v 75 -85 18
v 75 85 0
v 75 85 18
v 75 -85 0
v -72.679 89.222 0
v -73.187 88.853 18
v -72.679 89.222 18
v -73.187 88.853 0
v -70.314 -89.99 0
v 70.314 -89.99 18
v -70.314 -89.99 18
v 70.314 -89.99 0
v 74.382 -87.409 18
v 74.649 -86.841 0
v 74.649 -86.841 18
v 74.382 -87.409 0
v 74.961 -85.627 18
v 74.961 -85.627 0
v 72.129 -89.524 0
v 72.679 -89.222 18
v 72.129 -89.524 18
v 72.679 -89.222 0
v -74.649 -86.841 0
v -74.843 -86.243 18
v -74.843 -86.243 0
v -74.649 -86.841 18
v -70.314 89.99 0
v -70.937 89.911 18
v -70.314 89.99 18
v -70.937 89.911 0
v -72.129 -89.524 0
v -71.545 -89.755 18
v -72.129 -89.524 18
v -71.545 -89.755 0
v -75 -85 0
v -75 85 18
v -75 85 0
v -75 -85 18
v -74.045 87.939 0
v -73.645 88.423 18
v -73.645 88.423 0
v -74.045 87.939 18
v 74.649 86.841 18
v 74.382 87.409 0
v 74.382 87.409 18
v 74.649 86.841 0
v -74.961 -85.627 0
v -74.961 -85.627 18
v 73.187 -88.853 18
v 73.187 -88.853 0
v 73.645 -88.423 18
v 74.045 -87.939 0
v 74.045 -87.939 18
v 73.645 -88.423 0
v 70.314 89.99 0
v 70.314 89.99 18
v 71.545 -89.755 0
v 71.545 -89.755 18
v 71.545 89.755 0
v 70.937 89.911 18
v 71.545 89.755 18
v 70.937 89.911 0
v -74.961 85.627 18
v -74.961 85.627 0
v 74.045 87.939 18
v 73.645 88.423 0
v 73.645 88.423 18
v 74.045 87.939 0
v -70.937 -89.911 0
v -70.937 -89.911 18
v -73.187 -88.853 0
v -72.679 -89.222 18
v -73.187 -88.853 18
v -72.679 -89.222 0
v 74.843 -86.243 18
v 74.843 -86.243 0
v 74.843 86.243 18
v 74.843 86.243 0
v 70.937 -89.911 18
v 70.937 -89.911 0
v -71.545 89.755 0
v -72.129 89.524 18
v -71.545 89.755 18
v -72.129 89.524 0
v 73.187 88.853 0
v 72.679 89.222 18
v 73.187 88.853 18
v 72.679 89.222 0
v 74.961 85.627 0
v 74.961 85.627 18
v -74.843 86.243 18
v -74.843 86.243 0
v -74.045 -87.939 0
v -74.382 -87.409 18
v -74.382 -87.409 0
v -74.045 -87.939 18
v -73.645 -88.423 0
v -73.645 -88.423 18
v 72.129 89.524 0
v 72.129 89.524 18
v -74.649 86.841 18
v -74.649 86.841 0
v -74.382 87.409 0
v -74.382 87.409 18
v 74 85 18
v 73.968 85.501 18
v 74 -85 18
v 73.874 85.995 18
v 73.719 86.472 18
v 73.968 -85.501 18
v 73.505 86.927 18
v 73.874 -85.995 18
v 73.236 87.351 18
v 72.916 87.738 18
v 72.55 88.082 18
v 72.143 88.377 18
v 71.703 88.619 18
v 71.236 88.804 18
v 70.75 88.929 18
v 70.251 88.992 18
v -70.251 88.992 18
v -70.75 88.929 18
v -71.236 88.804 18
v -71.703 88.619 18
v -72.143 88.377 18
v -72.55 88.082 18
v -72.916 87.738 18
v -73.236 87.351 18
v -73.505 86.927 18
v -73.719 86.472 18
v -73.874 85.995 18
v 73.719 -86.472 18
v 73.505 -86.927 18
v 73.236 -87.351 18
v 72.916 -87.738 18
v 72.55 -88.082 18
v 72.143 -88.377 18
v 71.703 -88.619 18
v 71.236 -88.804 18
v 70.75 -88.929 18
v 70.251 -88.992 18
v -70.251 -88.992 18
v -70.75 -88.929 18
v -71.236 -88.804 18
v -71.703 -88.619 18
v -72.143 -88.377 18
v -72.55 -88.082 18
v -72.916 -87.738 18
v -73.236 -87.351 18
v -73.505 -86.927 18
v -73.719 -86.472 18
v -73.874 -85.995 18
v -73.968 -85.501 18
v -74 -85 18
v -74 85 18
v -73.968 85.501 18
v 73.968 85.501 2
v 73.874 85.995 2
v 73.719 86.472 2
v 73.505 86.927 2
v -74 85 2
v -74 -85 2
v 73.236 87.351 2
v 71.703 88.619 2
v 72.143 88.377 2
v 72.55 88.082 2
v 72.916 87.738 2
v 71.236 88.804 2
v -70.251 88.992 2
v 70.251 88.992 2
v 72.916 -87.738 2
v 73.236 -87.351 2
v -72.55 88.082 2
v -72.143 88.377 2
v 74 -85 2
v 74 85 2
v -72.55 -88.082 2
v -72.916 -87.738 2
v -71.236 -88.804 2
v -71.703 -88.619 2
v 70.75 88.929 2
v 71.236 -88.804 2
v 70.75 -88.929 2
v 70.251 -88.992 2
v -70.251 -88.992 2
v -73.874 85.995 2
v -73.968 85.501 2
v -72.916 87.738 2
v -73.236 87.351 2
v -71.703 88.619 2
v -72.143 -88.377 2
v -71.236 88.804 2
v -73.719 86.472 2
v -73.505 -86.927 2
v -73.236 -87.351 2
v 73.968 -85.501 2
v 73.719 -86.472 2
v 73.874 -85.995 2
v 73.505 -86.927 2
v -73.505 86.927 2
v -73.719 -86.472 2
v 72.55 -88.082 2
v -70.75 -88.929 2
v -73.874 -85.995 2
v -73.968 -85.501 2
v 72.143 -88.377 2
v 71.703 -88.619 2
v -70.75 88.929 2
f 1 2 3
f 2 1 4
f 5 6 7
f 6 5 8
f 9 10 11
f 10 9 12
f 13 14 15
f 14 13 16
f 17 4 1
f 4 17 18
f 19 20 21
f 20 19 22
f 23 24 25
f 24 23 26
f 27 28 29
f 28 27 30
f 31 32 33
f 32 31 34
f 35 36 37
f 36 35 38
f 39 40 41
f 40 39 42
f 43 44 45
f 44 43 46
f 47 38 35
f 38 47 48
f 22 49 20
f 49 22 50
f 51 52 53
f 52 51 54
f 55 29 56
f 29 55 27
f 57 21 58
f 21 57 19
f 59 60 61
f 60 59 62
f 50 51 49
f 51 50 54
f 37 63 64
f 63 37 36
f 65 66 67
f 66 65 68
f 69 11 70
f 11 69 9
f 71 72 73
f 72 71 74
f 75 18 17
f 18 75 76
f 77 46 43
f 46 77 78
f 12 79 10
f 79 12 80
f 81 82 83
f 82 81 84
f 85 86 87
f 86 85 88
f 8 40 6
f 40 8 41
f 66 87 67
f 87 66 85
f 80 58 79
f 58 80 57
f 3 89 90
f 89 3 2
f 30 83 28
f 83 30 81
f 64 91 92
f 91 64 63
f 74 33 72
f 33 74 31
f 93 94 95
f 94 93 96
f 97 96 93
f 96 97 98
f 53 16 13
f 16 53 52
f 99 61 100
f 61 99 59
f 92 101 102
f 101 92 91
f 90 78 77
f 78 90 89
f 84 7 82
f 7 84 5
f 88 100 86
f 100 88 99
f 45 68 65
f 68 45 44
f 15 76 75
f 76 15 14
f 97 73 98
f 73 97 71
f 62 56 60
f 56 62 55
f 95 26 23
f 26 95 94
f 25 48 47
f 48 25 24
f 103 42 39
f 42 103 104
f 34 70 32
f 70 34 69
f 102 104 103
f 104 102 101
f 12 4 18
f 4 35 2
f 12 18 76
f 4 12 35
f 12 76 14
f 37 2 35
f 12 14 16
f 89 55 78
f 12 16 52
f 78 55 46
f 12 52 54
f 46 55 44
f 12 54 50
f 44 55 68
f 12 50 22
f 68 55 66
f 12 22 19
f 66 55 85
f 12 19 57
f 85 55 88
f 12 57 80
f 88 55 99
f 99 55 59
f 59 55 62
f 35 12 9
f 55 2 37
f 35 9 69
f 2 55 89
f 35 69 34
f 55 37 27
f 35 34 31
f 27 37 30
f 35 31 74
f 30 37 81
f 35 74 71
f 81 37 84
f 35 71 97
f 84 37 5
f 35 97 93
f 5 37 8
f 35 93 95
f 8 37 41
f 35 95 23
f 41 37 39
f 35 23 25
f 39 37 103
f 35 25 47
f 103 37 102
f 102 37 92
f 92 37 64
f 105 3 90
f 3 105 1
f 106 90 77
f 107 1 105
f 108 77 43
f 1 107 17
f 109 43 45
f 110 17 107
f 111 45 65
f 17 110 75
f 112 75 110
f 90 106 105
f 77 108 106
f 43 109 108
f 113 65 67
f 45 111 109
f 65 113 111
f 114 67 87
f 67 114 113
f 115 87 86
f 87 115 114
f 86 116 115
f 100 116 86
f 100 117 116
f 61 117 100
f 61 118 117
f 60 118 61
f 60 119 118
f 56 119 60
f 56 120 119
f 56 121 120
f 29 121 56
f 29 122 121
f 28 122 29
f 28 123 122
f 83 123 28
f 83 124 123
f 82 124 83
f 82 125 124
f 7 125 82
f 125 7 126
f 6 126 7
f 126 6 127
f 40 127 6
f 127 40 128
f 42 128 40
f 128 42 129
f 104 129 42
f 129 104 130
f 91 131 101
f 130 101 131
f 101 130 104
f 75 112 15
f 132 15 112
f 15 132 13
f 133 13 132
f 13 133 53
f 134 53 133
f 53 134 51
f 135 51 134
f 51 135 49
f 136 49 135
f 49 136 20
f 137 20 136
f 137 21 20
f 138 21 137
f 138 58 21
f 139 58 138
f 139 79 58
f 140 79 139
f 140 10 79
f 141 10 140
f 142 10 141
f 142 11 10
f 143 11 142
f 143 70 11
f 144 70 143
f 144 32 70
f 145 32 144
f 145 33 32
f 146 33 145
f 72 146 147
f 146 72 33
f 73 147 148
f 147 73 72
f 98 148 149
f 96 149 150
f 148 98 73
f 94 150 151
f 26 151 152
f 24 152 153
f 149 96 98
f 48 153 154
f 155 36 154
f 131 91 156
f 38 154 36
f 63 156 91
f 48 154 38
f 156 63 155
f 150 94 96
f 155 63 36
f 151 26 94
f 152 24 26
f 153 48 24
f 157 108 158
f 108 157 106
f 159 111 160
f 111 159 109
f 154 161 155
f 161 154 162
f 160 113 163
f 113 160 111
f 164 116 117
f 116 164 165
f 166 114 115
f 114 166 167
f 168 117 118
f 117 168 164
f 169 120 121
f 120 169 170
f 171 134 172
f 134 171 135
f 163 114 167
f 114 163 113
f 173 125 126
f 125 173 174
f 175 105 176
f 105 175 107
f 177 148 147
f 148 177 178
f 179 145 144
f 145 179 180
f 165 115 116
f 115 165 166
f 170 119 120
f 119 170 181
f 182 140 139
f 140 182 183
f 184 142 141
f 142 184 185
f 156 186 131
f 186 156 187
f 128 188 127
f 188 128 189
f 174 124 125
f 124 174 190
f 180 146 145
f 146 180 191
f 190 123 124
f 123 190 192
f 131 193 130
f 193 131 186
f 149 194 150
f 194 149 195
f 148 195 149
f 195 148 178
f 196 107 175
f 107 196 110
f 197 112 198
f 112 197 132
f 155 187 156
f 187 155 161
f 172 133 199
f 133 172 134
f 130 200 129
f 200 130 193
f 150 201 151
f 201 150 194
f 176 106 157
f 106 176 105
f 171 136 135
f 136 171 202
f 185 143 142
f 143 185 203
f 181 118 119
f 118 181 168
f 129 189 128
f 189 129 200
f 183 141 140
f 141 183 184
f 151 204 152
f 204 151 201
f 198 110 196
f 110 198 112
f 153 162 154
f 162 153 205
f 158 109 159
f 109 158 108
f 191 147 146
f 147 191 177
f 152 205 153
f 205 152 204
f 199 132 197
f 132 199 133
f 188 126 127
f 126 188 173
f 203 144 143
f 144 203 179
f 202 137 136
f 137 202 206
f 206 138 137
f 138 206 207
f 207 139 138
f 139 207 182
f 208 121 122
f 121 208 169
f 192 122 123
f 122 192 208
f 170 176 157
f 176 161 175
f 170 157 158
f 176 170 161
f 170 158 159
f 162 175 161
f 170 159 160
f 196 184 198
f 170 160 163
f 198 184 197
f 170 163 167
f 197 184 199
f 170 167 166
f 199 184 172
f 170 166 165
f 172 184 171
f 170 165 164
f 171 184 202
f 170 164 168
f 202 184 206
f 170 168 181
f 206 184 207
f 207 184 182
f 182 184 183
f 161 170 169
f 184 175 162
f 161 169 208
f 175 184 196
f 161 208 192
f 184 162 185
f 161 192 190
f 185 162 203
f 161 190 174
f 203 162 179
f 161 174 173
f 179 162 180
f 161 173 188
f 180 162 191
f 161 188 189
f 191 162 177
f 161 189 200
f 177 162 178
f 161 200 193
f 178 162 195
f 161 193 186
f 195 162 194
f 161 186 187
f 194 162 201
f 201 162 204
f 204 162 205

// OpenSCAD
$fn = 50;


difference() {
	union() {
		hull() {
			translate(v = [-70.0000000000, 85.0000000000, 0]) {
				cylinder(h = 18, r = 5);
			}
			translate(v = [70.0000000000, 85.0000000000, 0]) {
				cylinder(h = 18, r = 5);
			}
			translate(v = [-70.0000000000, -85.0000000000, 0]) {
				cylinder(h = 18, r = 5);
			}
			translate(v = [70.0000000000, -85.0000000000, 0]) {
				cylinder(h = 18, r = 5);
			}
		}
	}
	union() {
		translate(v = [0, 0, 2]) {
			hull() {
				translate(v = [-70.0000000000, 85.0000000000, 0]) {
					cylinder(h = 16, r = 4);
				}
				translate(v = [70.0000000000, 85.0000000000, 0]) {
					cylinder(h = 16, r = 4);
				}
				translate(v = [-70.0000000000, -85.0000000000, 0]) {
					cylinder(h = 16, r = 4);
				}
				translate(v = [70.0000000000, -85.0000000000, 0]) {
					cylinder(h = 16, r = 4);
				}
			}
		}
	}
}
